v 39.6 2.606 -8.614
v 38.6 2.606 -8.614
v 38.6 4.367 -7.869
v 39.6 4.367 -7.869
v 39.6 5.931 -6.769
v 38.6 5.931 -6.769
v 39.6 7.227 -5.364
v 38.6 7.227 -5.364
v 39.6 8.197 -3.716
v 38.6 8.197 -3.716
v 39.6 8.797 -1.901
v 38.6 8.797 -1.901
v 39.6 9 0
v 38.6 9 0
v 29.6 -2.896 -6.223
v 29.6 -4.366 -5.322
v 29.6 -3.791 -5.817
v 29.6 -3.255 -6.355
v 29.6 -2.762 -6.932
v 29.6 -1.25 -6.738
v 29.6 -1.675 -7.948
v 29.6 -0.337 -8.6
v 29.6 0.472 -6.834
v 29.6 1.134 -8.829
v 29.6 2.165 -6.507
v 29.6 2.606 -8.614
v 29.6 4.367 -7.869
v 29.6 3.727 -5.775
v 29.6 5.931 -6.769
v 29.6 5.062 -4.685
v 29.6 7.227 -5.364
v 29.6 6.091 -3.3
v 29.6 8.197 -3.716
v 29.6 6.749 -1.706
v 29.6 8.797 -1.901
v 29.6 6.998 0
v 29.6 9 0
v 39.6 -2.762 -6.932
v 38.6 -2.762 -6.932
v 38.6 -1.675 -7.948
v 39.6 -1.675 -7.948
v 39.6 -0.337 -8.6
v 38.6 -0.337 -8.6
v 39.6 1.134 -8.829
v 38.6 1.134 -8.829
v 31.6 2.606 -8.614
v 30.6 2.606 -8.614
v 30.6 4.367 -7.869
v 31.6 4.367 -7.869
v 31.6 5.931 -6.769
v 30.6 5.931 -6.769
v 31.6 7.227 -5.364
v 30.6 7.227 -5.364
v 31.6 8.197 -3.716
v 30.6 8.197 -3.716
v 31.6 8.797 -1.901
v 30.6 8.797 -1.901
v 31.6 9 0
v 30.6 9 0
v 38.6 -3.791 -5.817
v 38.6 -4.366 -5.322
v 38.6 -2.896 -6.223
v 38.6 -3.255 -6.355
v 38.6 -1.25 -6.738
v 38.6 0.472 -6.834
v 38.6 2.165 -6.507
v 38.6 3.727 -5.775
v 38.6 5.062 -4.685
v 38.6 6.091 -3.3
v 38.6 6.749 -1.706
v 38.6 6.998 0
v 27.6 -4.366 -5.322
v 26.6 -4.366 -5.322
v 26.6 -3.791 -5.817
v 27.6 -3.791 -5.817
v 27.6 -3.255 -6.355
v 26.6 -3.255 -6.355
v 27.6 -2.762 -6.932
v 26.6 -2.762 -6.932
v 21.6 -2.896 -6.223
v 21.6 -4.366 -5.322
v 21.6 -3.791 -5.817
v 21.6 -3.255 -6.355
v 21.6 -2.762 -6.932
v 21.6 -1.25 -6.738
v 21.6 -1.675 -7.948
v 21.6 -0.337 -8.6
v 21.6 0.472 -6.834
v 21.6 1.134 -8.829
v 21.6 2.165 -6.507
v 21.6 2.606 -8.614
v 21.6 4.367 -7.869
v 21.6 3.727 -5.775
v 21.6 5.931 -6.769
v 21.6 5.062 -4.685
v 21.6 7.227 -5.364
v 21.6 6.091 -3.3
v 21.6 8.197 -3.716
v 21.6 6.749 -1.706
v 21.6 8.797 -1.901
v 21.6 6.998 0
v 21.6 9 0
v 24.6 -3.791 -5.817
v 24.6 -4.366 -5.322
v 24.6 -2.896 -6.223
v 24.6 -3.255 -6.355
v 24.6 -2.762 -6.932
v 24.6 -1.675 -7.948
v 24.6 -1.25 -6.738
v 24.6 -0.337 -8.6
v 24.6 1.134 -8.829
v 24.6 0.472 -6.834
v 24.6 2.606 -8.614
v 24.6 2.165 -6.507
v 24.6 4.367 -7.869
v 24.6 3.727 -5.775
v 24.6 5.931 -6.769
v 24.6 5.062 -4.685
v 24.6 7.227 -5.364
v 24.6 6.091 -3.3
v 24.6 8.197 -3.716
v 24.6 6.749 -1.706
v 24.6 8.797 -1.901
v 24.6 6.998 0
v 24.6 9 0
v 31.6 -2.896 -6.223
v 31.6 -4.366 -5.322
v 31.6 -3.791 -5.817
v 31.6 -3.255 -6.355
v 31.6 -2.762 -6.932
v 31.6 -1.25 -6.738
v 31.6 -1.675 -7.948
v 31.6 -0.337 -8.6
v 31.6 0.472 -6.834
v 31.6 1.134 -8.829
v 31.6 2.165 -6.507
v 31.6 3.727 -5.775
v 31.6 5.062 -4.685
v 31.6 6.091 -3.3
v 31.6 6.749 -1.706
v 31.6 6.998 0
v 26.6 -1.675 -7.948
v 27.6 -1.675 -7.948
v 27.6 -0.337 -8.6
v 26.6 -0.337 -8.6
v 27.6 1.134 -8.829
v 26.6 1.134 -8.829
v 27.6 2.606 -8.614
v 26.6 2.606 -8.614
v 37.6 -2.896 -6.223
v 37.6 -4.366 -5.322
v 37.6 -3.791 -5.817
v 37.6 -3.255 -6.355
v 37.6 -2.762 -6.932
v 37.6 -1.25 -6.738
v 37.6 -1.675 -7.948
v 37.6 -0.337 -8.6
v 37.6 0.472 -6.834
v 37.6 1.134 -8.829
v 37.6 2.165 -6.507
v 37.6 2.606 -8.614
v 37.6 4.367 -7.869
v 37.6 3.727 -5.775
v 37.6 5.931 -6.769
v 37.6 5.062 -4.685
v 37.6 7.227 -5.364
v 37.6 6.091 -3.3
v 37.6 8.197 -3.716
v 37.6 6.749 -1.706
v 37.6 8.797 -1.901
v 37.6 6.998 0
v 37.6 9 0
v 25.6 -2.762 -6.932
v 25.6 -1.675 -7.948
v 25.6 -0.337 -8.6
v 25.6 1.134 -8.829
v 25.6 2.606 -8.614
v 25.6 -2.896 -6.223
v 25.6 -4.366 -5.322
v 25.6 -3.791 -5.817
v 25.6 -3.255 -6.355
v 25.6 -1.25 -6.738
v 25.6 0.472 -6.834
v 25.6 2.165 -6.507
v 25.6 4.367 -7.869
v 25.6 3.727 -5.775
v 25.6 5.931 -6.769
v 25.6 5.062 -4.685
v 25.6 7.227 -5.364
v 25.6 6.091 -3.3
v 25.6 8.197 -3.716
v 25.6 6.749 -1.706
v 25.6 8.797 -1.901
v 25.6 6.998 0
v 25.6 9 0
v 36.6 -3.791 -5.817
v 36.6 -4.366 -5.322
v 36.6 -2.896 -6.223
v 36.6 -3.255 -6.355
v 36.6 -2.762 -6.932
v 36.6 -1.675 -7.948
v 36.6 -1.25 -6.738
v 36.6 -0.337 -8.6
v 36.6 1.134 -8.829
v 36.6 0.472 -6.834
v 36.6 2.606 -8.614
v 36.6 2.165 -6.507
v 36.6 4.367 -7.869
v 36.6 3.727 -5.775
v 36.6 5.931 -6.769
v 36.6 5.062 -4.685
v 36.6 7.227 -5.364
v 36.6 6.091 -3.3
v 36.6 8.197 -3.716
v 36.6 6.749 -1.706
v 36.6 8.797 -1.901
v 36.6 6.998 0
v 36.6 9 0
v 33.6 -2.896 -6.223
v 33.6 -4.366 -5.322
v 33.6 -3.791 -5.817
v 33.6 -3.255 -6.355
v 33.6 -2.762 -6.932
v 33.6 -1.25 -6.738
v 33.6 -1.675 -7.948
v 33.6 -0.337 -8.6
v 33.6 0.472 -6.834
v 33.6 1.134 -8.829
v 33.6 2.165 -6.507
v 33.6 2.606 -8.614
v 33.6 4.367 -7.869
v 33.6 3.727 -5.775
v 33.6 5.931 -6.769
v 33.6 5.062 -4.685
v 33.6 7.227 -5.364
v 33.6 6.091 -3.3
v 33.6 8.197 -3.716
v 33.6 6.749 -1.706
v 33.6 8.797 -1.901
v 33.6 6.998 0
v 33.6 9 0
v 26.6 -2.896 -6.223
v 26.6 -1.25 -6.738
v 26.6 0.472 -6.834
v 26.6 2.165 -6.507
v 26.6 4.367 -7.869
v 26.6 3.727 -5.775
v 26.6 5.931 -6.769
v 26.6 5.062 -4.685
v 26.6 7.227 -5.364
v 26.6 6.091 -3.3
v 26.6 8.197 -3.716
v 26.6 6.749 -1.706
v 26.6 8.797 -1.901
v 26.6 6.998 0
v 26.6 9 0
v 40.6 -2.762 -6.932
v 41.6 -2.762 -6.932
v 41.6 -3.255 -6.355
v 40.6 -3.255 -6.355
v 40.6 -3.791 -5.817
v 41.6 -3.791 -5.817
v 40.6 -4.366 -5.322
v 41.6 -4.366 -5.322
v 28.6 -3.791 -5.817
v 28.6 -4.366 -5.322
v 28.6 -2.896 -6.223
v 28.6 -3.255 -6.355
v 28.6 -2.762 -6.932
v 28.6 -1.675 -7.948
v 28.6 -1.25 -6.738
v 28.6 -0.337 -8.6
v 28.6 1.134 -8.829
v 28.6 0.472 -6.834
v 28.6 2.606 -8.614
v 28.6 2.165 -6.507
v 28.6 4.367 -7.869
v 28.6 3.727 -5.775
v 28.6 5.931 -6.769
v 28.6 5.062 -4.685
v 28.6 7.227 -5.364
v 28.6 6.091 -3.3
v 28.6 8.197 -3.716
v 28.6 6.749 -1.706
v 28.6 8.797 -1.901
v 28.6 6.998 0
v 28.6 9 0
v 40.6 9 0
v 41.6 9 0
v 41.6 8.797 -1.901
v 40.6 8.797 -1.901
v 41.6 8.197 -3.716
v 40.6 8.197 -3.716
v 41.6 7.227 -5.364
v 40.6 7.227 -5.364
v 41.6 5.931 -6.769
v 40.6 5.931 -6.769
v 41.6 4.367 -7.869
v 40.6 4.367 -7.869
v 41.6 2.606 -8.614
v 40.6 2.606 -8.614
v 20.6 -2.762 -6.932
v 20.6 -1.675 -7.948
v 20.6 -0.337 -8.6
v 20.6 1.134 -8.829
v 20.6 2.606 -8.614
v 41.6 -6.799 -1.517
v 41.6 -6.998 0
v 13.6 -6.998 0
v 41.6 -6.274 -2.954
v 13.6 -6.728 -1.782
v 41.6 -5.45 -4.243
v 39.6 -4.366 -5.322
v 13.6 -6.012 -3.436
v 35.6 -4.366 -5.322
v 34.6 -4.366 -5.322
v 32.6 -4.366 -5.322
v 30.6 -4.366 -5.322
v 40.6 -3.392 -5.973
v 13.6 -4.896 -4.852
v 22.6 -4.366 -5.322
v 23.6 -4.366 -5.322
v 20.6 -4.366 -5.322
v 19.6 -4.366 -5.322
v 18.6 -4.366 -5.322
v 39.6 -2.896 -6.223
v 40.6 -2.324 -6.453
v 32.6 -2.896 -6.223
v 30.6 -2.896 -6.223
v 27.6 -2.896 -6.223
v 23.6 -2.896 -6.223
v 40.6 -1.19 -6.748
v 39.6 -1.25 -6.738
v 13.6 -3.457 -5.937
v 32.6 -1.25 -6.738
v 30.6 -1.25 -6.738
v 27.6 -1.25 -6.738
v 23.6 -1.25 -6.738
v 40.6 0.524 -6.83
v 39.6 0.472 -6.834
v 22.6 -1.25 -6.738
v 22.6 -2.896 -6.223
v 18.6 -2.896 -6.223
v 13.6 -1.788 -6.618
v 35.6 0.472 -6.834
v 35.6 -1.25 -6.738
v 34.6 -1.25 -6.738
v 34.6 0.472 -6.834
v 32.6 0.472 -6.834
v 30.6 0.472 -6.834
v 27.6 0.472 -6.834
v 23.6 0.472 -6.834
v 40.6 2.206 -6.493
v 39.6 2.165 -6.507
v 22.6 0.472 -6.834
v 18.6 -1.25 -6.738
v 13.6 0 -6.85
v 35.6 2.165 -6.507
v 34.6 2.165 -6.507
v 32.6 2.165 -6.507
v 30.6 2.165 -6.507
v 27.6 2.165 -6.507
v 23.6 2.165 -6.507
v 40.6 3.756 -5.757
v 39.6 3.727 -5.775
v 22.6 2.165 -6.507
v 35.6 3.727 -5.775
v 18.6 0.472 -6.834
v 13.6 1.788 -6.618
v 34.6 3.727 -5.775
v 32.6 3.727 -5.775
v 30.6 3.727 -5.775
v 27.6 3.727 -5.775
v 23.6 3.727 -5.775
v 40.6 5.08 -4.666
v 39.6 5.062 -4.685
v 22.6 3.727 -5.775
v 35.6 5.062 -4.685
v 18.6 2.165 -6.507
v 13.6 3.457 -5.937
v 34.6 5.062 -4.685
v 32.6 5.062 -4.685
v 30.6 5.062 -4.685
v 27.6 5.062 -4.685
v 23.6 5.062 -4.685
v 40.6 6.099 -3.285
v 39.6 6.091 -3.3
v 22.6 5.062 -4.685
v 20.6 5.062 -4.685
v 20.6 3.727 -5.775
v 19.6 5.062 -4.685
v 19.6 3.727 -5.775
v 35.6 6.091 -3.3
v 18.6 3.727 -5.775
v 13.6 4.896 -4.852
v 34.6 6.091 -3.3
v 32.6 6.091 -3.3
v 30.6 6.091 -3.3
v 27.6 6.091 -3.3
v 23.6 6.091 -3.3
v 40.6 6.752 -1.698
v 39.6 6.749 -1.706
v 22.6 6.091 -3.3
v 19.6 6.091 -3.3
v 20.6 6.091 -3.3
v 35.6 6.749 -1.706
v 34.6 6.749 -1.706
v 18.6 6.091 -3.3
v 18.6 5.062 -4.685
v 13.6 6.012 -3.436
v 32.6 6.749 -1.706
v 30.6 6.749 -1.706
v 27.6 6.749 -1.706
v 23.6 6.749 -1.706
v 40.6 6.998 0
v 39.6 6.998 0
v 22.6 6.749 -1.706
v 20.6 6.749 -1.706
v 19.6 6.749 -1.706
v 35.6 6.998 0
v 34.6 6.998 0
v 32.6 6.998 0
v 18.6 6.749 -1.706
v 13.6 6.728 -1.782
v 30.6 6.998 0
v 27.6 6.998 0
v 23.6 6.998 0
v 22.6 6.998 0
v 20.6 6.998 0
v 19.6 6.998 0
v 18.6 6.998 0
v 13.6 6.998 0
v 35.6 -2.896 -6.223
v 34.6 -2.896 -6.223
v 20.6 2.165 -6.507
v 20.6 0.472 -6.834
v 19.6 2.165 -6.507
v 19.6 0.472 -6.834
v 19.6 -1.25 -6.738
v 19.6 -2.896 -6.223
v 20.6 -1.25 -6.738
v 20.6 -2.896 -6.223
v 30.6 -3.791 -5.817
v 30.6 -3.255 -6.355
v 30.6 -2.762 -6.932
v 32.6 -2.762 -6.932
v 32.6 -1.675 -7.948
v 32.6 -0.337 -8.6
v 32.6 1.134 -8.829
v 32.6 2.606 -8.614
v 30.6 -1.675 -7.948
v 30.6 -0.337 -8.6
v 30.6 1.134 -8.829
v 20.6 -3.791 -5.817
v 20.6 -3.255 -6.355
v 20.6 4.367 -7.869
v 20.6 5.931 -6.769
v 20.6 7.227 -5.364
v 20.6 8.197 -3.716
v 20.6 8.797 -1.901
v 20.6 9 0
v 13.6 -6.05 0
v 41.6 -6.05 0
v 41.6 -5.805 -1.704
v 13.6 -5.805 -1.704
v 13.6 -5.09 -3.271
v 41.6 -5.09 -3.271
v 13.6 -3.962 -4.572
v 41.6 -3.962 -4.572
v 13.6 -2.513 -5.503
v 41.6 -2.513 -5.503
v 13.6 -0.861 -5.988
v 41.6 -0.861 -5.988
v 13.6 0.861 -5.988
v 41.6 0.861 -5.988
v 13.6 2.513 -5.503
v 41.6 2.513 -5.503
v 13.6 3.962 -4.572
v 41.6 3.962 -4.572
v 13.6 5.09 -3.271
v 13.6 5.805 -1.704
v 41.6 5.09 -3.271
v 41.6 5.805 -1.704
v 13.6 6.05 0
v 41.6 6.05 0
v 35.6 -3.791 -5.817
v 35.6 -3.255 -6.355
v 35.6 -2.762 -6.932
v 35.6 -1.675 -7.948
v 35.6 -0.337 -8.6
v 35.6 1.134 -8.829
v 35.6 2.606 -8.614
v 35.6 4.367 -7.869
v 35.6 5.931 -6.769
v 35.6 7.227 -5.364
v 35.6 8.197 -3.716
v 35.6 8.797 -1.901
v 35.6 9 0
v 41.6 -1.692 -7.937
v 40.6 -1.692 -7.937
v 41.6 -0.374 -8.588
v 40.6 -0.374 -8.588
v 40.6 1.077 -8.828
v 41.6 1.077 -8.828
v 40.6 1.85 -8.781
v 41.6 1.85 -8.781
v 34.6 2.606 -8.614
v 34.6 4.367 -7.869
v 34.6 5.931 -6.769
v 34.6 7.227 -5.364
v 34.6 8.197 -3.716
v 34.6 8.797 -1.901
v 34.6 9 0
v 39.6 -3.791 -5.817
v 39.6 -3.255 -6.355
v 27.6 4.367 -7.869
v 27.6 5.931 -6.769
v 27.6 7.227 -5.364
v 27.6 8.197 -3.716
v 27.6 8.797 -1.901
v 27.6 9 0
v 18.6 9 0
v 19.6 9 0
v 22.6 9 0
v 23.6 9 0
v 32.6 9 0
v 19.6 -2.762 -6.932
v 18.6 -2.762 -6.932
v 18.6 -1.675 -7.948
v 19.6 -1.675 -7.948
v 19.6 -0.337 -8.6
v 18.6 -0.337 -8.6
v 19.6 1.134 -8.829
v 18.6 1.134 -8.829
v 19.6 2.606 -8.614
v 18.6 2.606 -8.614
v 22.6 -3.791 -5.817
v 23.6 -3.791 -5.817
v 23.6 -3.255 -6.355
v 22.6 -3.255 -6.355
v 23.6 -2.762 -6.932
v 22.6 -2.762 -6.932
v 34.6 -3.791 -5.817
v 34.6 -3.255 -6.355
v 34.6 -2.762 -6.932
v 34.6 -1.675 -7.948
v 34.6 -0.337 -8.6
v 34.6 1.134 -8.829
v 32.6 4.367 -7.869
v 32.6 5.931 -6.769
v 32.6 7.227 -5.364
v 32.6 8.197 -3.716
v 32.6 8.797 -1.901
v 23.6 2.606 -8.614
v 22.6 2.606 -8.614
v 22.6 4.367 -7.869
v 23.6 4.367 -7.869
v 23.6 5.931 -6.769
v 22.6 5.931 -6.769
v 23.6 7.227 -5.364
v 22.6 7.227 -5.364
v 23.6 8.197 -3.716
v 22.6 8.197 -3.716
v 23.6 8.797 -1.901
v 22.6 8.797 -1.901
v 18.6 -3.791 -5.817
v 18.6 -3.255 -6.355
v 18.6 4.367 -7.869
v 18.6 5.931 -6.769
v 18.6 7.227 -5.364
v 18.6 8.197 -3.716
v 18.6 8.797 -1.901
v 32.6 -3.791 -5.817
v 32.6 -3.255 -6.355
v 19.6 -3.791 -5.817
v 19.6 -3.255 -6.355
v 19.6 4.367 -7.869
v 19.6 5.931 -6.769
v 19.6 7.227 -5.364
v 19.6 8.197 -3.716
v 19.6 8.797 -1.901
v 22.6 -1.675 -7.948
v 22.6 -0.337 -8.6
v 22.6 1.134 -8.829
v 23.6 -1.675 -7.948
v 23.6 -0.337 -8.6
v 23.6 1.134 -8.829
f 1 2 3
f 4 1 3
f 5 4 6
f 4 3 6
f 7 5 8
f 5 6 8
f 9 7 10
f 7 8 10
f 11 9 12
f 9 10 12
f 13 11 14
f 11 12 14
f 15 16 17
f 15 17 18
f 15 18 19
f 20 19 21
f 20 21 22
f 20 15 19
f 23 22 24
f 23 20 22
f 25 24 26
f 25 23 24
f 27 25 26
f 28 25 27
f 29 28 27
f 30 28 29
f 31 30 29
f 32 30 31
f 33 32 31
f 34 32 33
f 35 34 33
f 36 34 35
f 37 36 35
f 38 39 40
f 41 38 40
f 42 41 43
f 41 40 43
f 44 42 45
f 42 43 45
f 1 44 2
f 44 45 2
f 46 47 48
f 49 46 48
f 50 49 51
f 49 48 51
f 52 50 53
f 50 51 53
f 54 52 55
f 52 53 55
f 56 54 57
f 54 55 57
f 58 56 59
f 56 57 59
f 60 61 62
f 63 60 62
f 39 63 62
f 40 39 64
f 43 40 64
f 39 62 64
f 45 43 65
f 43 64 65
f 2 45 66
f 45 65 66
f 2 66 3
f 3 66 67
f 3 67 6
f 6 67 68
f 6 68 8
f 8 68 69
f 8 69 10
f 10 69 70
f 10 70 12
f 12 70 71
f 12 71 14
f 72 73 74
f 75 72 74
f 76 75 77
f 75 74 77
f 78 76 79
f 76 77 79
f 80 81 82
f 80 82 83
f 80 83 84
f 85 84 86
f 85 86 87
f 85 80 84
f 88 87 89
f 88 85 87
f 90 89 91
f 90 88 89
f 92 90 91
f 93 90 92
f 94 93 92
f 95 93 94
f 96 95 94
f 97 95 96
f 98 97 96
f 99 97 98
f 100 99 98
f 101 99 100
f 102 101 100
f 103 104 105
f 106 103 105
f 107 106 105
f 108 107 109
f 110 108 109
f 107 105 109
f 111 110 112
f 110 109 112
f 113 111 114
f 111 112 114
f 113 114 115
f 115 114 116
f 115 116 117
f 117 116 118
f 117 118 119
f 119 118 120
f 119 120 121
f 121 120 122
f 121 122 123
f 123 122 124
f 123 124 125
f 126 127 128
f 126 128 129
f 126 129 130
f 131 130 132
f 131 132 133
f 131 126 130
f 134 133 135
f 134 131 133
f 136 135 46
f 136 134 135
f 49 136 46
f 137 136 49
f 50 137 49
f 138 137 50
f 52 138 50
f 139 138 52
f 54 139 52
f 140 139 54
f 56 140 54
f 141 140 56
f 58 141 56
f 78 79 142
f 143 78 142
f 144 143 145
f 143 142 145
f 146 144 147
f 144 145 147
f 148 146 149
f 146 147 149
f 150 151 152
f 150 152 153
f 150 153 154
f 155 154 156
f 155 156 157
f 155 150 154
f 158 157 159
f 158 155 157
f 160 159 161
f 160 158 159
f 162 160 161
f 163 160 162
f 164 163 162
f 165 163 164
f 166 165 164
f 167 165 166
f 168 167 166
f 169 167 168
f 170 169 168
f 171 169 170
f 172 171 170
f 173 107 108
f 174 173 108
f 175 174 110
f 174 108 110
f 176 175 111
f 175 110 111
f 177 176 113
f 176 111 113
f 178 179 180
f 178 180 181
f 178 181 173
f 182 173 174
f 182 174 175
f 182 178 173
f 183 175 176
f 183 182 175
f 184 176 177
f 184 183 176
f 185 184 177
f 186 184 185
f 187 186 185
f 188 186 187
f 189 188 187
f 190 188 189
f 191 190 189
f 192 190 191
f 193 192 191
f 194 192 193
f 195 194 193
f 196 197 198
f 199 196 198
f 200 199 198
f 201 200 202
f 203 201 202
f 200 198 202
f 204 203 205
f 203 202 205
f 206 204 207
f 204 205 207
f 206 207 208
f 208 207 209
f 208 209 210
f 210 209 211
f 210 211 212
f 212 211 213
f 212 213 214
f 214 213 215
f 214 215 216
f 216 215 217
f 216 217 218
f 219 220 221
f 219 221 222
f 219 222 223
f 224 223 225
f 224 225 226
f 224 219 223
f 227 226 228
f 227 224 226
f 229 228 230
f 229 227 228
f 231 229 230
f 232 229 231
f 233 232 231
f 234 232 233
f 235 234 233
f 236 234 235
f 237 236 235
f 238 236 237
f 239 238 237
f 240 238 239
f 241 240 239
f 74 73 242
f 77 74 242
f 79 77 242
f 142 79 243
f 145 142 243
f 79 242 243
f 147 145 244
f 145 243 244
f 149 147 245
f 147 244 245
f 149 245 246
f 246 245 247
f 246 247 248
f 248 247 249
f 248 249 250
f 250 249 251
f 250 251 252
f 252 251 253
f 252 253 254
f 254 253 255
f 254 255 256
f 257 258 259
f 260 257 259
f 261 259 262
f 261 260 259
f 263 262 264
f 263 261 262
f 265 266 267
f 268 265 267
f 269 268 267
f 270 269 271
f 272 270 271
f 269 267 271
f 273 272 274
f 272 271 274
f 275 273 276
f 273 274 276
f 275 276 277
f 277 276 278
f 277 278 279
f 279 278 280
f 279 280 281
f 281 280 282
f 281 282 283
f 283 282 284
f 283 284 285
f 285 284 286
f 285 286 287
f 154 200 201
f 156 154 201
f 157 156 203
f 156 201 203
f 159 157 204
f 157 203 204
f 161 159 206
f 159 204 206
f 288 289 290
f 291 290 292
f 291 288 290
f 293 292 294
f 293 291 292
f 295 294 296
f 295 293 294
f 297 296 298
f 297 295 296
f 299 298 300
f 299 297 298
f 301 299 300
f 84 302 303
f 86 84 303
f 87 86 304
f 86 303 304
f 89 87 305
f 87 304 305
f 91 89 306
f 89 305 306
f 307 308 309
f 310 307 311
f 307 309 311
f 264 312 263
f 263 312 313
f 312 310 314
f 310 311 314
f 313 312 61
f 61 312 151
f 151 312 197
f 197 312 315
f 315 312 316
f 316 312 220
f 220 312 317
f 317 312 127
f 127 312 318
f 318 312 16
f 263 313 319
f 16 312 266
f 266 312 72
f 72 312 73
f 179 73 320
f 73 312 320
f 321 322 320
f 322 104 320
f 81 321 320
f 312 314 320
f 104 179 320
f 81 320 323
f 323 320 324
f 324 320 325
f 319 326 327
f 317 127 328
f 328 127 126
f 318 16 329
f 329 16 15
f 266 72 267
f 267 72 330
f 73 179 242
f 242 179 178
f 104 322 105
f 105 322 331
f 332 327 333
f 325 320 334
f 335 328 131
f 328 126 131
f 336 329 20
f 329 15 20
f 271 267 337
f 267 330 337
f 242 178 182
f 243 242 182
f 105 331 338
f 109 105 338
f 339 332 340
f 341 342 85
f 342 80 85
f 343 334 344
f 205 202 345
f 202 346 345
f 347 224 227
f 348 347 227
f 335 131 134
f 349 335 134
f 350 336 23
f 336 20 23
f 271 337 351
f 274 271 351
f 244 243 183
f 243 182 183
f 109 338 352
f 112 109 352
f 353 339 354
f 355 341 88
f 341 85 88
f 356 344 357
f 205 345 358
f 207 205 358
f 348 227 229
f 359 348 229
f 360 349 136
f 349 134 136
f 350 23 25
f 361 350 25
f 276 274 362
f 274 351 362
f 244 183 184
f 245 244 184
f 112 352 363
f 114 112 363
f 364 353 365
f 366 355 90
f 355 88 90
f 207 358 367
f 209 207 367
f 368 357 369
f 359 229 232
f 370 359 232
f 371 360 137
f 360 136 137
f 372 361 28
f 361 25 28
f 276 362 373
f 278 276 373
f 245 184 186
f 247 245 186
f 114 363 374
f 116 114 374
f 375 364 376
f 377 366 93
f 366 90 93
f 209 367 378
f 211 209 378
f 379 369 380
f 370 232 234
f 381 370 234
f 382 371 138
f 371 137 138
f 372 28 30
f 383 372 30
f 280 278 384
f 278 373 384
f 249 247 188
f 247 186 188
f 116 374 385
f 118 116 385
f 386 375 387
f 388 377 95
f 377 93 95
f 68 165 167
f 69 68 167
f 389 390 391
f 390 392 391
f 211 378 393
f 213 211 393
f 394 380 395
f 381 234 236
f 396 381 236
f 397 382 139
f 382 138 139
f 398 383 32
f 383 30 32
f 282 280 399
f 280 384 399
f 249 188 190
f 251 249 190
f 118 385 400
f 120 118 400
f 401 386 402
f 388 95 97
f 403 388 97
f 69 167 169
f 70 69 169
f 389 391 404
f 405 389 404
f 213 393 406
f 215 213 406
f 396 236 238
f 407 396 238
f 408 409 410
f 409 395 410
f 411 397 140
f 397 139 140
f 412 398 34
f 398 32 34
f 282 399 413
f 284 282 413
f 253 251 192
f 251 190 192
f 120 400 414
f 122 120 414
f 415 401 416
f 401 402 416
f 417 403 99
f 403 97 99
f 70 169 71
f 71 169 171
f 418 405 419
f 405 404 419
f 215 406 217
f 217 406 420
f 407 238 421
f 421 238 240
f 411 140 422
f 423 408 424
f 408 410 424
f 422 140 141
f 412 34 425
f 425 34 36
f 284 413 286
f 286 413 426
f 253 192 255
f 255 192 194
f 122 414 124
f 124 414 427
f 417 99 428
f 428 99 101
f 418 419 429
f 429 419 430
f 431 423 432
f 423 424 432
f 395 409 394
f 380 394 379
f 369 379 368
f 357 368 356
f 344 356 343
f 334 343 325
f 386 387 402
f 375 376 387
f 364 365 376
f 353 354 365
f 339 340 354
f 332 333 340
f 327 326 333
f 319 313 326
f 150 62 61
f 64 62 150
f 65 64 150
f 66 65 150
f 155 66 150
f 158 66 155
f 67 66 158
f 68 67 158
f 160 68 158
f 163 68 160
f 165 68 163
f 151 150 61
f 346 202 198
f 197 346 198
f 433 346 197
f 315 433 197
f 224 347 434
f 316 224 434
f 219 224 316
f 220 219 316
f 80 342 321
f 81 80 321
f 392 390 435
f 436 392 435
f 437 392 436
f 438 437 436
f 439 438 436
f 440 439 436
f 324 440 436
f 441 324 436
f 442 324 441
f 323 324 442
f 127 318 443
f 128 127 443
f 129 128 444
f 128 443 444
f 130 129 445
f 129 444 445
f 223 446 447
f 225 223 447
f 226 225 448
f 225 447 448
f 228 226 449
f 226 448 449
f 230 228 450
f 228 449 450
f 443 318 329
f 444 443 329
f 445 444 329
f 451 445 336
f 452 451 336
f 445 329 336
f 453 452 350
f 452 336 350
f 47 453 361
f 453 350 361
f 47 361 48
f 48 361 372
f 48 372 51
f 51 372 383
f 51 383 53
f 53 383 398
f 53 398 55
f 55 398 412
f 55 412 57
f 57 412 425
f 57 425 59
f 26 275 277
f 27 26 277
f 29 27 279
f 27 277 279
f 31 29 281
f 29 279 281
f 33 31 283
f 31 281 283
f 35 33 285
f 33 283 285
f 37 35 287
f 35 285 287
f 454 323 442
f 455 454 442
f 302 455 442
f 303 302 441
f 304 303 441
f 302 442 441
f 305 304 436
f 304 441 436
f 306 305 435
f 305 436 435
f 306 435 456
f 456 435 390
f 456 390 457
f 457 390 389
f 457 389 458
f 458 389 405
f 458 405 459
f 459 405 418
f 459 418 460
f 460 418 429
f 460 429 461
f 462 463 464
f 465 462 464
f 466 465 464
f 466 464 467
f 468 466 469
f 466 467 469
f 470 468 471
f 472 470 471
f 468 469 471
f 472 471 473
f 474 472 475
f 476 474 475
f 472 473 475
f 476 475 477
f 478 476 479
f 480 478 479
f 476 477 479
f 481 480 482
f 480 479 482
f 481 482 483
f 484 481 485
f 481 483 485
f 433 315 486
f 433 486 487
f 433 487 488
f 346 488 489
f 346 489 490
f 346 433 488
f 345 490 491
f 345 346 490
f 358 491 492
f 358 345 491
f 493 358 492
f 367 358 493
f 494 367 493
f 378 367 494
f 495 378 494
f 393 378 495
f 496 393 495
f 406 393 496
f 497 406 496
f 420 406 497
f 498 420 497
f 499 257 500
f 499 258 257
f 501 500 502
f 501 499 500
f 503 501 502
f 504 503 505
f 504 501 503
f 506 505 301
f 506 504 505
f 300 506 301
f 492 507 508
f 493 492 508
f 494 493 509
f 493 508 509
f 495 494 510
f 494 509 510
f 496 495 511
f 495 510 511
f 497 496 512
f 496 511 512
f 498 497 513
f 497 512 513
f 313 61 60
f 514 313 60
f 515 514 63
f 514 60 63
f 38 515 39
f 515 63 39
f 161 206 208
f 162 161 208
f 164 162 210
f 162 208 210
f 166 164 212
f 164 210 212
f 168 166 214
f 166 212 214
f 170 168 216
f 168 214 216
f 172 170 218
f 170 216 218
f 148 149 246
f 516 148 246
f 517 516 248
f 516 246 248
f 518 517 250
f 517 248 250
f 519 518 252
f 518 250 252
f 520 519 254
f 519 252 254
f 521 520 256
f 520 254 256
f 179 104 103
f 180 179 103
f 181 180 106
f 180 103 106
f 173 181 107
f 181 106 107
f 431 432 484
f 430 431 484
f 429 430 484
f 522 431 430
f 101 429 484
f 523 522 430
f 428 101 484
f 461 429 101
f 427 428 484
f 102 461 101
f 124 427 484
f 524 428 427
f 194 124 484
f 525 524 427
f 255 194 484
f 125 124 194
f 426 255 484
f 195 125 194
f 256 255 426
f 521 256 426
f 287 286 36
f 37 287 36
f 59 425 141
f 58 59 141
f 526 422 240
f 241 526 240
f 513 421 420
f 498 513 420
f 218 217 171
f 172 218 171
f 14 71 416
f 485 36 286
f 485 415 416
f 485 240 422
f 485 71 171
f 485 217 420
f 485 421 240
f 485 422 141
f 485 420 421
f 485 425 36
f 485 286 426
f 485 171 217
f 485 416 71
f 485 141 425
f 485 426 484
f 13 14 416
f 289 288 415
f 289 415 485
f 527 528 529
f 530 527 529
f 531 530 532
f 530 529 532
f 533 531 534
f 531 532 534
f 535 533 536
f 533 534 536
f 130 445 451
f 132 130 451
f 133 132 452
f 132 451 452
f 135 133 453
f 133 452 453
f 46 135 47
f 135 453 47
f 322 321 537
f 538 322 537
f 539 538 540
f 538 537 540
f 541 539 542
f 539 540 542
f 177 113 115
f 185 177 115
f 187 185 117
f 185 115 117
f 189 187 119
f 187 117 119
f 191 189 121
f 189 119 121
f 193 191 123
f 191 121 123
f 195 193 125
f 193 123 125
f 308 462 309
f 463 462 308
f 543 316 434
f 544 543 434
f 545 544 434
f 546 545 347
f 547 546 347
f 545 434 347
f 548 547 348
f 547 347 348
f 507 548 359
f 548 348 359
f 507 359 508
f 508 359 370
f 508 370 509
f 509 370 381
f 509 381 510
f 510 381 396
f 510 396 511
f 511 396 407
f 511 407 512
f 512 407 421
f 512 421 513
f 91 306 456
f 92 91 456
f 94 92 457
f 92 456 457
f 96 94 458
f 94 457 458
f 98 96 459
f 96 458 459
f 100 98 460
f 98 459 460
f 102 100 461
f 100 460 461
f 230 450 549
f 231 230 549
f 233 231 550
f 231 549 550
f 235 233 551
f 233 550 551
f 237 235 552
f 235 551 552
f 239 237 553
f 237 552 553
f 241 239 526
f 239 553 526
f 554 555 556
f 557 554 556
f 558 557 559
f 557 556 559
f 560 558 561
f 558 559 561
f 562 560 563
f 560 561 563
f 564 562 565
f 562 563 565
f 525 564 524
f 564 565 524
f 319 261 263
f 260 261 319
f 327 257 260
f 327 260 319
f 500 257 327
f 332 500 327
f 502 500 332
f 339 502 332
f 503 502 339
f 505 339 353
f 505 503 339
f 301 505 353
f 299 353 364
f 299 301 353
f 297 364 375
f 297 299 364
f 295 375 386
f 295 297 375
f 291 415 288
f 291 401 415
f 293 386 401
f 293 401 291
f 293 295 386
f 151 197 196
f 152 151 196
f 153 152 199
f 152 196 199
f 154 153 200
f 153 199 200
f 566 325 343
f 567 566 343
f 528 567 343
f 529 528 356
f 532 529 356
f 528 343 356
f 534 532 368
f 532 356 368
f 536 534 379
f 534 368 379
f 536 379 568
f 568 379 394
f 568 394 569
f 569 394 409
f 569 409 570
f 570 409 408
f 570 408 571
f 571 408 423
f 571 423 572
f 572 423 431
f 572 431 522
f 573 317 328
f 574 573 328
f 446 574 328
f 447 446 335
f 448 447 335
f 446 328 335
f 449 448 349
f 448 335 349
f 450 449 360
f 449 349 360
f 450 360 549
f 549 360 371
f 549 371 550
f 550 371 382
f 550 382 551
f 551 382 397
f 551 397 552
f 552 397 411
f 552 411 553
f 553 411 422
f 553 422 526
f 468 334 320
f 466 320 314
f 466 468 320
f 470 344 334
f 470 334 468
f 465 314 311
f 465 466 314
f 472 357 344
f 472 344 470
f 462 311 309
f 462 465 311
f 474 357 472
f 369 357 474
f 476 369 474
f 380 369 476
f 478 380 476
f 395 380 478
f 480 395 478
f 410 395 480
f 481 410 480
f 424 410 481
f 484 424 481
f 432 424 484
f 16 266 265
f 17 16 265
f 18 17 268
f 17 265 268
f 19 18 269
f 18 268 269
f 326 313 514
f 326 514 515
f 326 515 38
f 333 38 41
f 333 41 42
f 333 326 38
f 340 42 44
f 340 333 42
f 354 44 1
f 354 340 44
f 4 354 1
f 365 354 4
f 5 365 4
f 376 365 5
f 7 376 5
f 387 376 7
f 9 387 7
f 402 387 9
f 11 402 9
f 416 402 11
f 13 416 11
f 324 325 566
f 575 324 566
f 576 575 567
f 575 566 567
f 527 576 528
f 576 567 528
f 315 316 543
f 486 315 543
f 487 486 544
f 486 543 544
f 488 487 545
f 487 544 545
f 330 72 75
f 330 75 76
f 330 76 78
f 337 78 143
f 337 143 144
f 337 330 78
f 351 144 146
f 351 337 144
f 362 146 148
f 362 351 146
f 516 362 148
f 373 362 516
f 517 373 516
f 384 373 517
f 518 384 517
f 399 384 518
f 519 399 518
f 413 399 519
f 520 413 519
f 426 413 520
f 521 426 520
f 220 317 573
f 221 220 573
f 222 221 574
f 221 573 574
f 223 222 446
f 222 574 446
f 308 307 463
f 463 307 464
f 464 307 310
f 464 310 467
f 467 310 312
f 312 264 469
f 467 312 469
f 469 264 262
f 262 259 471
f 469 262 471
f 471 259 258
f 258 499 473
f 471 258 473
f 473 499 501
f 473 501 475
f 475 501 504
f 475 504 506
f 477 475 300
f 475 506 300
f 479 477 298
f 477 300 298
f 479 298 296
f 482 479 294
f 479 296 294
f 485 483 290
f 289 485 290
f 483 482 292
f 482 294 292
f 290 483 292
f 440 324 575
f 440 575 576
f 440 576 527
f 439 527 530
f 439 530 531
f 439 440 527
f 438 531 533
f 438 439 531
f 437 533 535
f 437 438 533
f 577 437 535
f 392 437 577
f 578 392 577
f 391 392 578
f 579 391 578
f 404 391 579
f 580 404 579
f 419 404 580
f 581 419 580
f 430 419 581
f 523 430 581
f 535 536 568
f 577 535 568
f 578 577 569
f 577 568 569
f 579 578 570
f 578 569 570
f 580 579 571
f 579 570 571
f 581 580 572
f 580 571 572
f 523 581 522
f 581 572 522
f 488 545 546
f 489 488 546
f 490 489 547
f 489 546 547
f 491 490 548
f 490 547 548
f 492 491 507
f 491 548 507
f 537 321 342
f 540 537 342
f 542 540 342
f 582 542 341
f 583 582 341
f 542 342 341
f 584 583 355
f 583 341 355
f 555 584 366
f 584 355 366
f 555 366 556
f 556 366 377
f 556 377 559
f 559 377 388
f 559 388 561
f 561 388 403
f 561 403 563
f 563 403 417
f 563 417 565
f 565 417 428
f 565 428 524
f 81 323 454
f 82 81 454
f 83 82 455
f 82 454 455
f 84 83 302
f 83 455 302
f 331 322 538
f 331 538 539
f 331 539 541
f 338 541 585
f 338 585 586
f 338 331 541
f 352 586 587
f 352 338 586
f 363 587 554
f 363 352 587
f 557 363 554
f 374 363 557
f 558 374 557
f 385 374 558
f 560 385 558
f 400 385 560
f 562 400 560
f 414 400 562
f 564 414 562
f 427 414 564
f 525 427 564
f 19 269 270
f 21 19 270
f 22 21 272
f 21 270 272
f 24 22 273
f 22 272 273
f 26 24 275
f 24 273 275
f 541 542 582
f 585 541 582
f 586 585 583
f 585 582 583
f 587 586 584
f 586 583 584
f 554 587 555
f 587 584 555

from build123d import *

# Parameters (mm, degrees)
SKETCH1_R           = 7
SKETCH1_R_2         = 0.8
SKETCH1_R_3         = 4
BOSS_EXTRUDE1_DEPTH = 1.5
SKETCH2_R           = 7
SKETCH2_R_2         = 6.4
BOSS_EXTRUDE2_DEPTH = 40.1
BOSS_EXTRUDE5_REACH = 44.786
SKETCH12_R          = 6.4
SKETCH12_R_2        = 6.05
BOSS_EXTRUDE7_START = -1
BOSS_EXTRUDE7_DEPTH = 1
FILLET2_R           = 10
FILLET3_R           = 5
LPATTERN1_START     = 18.6
LPATTERN1_DEPTH     = 1
LPATTERN1_START_2   = 20.6
LPATTERN1_2_DEPTH   = 1
LPATTERN1_START_3   = 22.6
LPATTERN1_3_DEPTH   = 1
LPATTERN1_START_4   = 24.6
LPATTERN1_4_DEPTH   = 1
LPATTERN1_START_5   = 26.6
LPATTERN1_5_DEPTH   = 1
LPATTERN1_START_6   = 28.6
LPATTERN1_6_DEPTH   = 1
LPATTERN1_START_7   = 30.6
LPATTERN1_7_DEPTH   = 1
LPATTERN1_START_8   = 32.6
LPATTERN1_8_DEPTH   = 1
LPATTERN1_START_9   = 34.6
LPATTERN1_9_DEPTH   = 1
LPATTERN1_START_10  = 36.6
LPATTERN1_10_DEPTH  = 1
LPATTERN1_START_11  = 38.6
LPATTERN1_11_DEPTH  = 1
SKETCH15_W          = 17.693531028
SKETCH15_H          = 16
SKETCH16_W          = 28
SKETCH16_H          = 16


with BuildPart() as part:
    # Sketch1 → Boss-Extrude1 (new body)
    with BuildSketch(Plane(origin=(0, 0, 0), x_dir=(0, 0, -1), z_dir=(1, 0, 0))):
        with Locations((-0.15, 0)):
            Circle(SKETCH1_R)
        with Locations((0, 5)):
            Circle(SKETCH1_R_2, mode=Mode.SUBTRACT)
        with Locations((-4.330127019, -2.5)):
            Circle(SKETCH1_R_2, mode=Mode.SUBTRACT)
        with Locations((4.330127019, -2.5)):
            Circle(SKETCH1_R_2, mode=Mode.SUBTRACT)
        Circle(SKETCH1_R_3, mode=Mode.SUBTRACT)
    extrude(amount=BOSS_EXTRUDE1_DEPTH)

    # Sketch2 → Boss-Extrude2 (add)
    with BuildSketch(Plane(origin=(1.5, 0, 0), x_dir=(0, 0, -1), z_dir=(1, 0, 0))):
        with Locations((-0.15, 0)):
            Circle(SKETCH2_R)
        with Locations((-0.15, 0)):
            Circle(SKETCH2_R_2, mode=Mode.SUBTRACT)
    extrude(amount=BOSS_EXTRUDE2_DEPTH)

    # Sketch12 → Boss-Extrude5 (add, up to next)
    with BuildSketch(Plane(origin=(41.6, 0, 0), x_dir=(0, 0, -1), z_dir=(1, 0, 0)), mode=Mode.PRIVATE) as boss_extrude5_sk1:
        with Locations((-0.15, 0)):
            Circle(SKETCH12_R)
        Circle(SKETCH12_R_2, mode=Mode.SUBTRACT)
    boss_extrude5_tool1 = extrude(boss_extrude5_sk1.sketch, amount=-BOSS_EXTRUDE5_REACH, mode=Mode.PRIVATE) - part.part
    add(boss_extrude5_tool1.solids().sort_by_distance((41.6, 0, 6.368981))[0])

    # Sketch14 → Boss-Extrude7 (add)
    with BuildSketch(Plane(origin=(41.6, 0, 0), x_dir=(0, 0, -1), z_dir=(1, 0, 0)).offset(BOSS_EXTRUDE7_START)):
        with BuildLine():
            Line((-7.039083492, -1.241180339), (-8.863269777, -1.562833599))
            ThreePointArc((-8.863269777, -1.562833599), (0, 9), (8.863269777, -1.562833599))
            Line((8.863269777, -1.562833599), (6.748129599, -1.189877318))
            ThreePointArc((6.748129599, -1.189877318), (-0.176047227, 6.999951539), (-7.039083492, -1.241180339))
        make_face()
    extrude(amount=BOSS_EXTRUDE7_DEPTH)

    # Fillet2
    # the kernel refuses this fillet: 10 mm, written as the material it adds along each edge
    with BuildSketch(Plane(origin=(40.6, -1.189877318, -6.748129599), x_dir=(0, -0.9122124275498226, 0.40971756982543417), z_dir=(1, 0, 0))) as fillet2_piece_1:
        with BuildLine():
            CenterArc((5.968676638, 9.685818843), FILLET2_R, 229.495547536, 26.104158306)
            Line((-0.526394739, 2.082263897), (-0.656296166, 1.930192799))
            ThreePointArc((-0.656296166, 1.930192799), (-0.457097485, 0.992114146), (-0.193900116, -0.049017803))
            Line((-0.193900116, -0.049017803), (0.049738972, -0.193716377))
            ThreePointArc((0.049738972, -0.193716377), (1.740864019, 0.01992681), (3.431989067, -0.193716377))
            Line((3.431989067, -0.193716377), (3.481728039, 0))
        make_face()
    extrude(amount=1)
    with BuildSketch(Plane(origin=(40.6, -1.241180339, 7.039083492), x_dir=(0, -0.9145376119425217, -0.4045008731047063), z_dir=(1, 0, 0))) as fillet2_piece_2:
        with BuildLine():
            CenterArc((5.662402917, -9.717692138), FILLET2_R, 103.646653122, 23.987142505)
            Line((-0.443720941, -1.798395993), (-0.565843418, -1.64001007))
            ThreePointArc((-0.565843418, -1.64001007), (-0.416037384, -0.851288435), (-0.194176914, 0.047909561))
            Line((-0.194176914, 0.047909561), (0.047186691, 0.194353843))
            ThreePointArc((0.047186691, 0.194353843), (1.651534184, 0.002384497), (3.255881677, 0.194353843))
            Line((3.255881677, 0.194353843), (3.303068368, 0))
        make_face()
    extrude(amount=1)

    # Fillet3
    fillet3_edges = [part.edges().sort_by_distance(p)[0] for p in [
        (41.1, -1.562833599, 8.863269777),
        (41.1, -1.562833599, -8.863269777),
    ]]
    fillet(fillet3_edges, radius=FILLET3_R)

    # LPattern1: read off the stored shape, not the designer's step
    # LPattern1 outline → LPattern1 (add)
    with BuildSketch(Plane.YZ.offset(LPATTERN1_START)):
        with BuildLine():
            ThreePointArc((-2.762069023, -6.931785952), (-0.336916962, -8.599750686), (2.606424088, -8.614322578))
            ThreePointArc((2.606424088, -8.614322578), (8.998759062, 0.149450112), (2.31893468, 8.696122236))
            ThreePointArc((2.31893468, 8.696122236), (-0.448823677, 8.641049813), (-2.763066821, 7.121905987))
            ThreePointArc((-2.763066821, 7.121905987), (-3.475808056, 6.373673153), (-4.261960597, 5.702989453))
            ThreePointArc((-4.261960597, 5.702989453), (6.999688602, 0.083973644), (-4.365952904, -5.321604449))
            ThreePointArc((-4.365952904, -5.321604449), (-3.518119256, -6.080982981), (-2.762069023, -6.931785952))
        make_face()
    extrude(amount=LPATTERN1_DEPTH)

    # LPattern1 2 outline → LPattern1 2 (add)
    with BuildSketch(Plane.YZ.offset(LPATTERN1_START_2)):
        with BuildLine():
            ThreePointArc((-2.762069023, -6.931785952), (-0.336916962, -8.599750686), (2.606424088, -8.614322578))
            ThreePointArc((2.606424088, -8.614322578), (8.998759062, 0.149450112), (2.31893468, 8.696122236))
            ThreePointArc((2.31893468, 8.696122236), (-0.448823677, 8.641049813), (-2.763066821, 7.121905987))
            ThreePointArc((-2.763066821, 7.121905987), (-3.475808056, 6.373673153), (-4.261960597, 5.702989453))
            ThreePointArc((-4.261960597, 5.702989453), (6.999688602, 0.083973644), (-4.365952904, -5.321604449))
            ThreePointArc((-4.365952904, -5.321604449), (-3.518119256, -6.080982981), (-2.762069023, -6.931785952))
        make_face()
    extrude(amount=LPATTERN1_2_DEPTH)

    # LPattern1 3 outline → LPattern1 3 (add)
    with BuildSketch(Plane.YZ.offset(LPATTERN1_START_3)):
        with BuildLine():
            ThreePointArc((-2.762069023, -6.931785952), (-0.336916962, -8.599750686), (2.606424088, -8.614322578))
            ThreePointArc((2.606424088, -8.614322578), (8.998759062, 0.149450112), (2.31893468, 8.696122236))
            ThreePointArc((2.31893468, 8.696122236), (-0.448823677, 8.641049813), (-2.763066821, 7.121905987))
            ThreePointArc((-2.763066821, 7.121905987), (-3.475808056, 6.373673153), (-4.261960597, 5.702989453))
            ThreePointArc((-4.261960597, 5.702989453), (6.999688602, 0.083973644), (-4.365952904, -5.321604449))
            ThreePointArc((-4.365952904, -5.321604449), (-3.518119256, -6.080982981), (-2.762069023, -6.931785952))
        make_face()
    extrude(amount=LPATTERN1_3_DEPTH)

    # LPattern1 4 outline → LPattern1 4 (add)
    with BuildSketch(Plane.YZ.offset(LPATTERN1_START_4)):
        with BuildLine():
            ThreePointArc((-2.762069023, -6.931785952), (-0.336916962, -8.599750686), (2.606424088, -8.614322578))
            ThreePointArc((2.606424088, -8.614322578), (8.998759062, 0.149450112), (2.31893468, 8.696122236))
            ThreePointArc((2.31893468, 8.696122236), (-0.448823677, 8.641049813), (-2.763066821, 7.121905987))
            ThreePointArc((-2.763066821, 7.121905987), (-3.475808056, 6.373673153), (-4.261960597, 5.702989453))
            ThreePointArc((-4.261960597, 5.702989453), (6.999688602, 0.083973644), (-4.365952904, -5.321604449))
            ThreePointArc((-4.365952904, -5.321604449), (-3.518119256, -6.080982981), (-2.762069023, -6.931785952))
        make_face()
    extrude(amount=LPATTERN1_4_DEPTH)

    # LPattern1 5 outline → LPattern1 5 (add)
    with BuildSketch(Plane.YZ.offset(LPATTERN1_START_5)):
        with BuildLine():
            ThreePointArc((-2.762069023, -6.931785952), (-0.336916962, -8.599750686), (2.606424088, -8.614322578))
            ThreePointArc((2.606424088, -8.614322578), (8.998759062, 0.149450112), (2.31893468, 8.696122236))
            ThreePointArc((2.31893468, 8.696122236), (-0.448823677, 8.641049813), (-2.763066821, 7.121905987))
            ThreePointArc((-2.763066821, 7.121905987), (-3.475808056, 6.373673153), (-4.261960597, 5.702989453))
            ThreePointArc((-4.261960597, 5.702989453), (6.999688602, 0.083973644), (-4.365952904, -5.321604449))
            ThreePointArc((-4.365952904, -5.321604449), (-3.518119256, -6.080982981), (-2.762069023, -6.931785952))
        make_face()
    extrude(amount=LPATTERN1_5_DEPTH)

    # LPattern1 6 outline → LPattern1 6 (add)
    with BuildSketch(Plane.YZ.offset(LPATTERN1_START_6)):
        with BuildLine():
            ThreePointArc((-2.762069023, -6.931785952), (-0.336916962, -8.599750686), (2.606424088, -8.614322578))
            ThreePointArc((2.606424088, -8.614322578), (8.998759062, 0.149450112), (2.31893468, 8.696122236))
            ThreePointArc((2.31893468, 8.696122236), (-0.448823677, 8.641049813), (-2.763066821, 7.121905987))
            ThreePointArc((-2.763066821, 7.121905987), (-3.475808056, 6.373673153), (-4.261960597, 5.702989453))
            ThreePointArc((-4.261960597, 5.702989453), (6.999688602, 0.083973644), (-4.365952904, -5.321604449))
            ThreePointArc((-4.365952904, -5.321604449), (-3.518119256, -6.080982981), (-2.762069023, -6.931785952))
        make_face()
    extrude(amount=LPATTERN1_6_DEPTH)

    # LPattern1 7 outline → LPattern1 7 (add)
    with BuildSketch(Plane.YZ.offset(LPATTERN1_START_7)):
        with BuildLine():
            ThreePointArc((-2.762069023, -6.931785952), (-0.336916962, -8.599750686), (2.606424088, -8.614322578))
            ThreePointArc((2.606424088, -8.614322578), (8.998759062, 0.149450112), (2.31893468, 8.696122236))
            ThreePointArc((2.31893468, 8.696122236), (-0.448823677, 8.641049813), (-2.763066821, 7.121905987))
            ThreePointArc((-2.763066821, 7.121905987), (-3.475808056, 6.373673153), (-4.261960597, 5.702989453))
            ThreePointArc((-4.261960597, 5.702989453), (6.999688602, 0.083973644), (-4.365952904, -5.321604449))
            ThreePointArc((-4.365952904, -5.321604449), (-3.518119256, -6.080982981), (-2.762069023, -6.931785952))
        make_face()
    extrude(amount=LPATTERN1_7_DEPTH)

    # LPattern1 8 outline → LPattern1 8 (add)
    with BuildSketch(Plane.YZ.offset(LPATTERN1_START_8)):
        with BuildLine():
            ThreePointArc((-2.762069023, -6.931785952), (-0.336916962, -8.599750686), (2.606424088, -8.614322578))
            ThreePointArc((2.606424088, -8.614322578), (8.998759062, 0.149450112), (2.31893468, 8.696122236))
            ThreePointArc((2.31893468, 8.696122236), (-0.448823677, 8.641049813), (-2.763066821, 7.121905987))
            ThreePointArc((-2.763066821, 7.121905987), (-3.475808056, 6.373673153), (-4.261960597, 5.702989453))
            ThreePointArc((-4.261960597, 5.702989453), (6.999688602, 0.083973644), (-4.365952904, -5.321604449))
            ThreePointArc((-4.365952904, -5.321604449), (-3.518119256, -6.080982981), (-2.762069023, -6.931785952))
        make_face()
    extrude(amount=LPATTERN1_8_DEPTH)

    # LPattern1 9 outline → LPattern1 9 (add)
    with BuildSketch(Plane.YZ.offset(LPATTERN1_START_9)):
        with BuildLine():
            ThreePointArc((-2.762069023, -6.931785952), (-0.336916962, -8.599750686), (2.606424088, -8.614322578))
            ThreePointArc((2.606424088, -8.614322578), (8.998759062, 0.149450112), (2.31893468, 8.696122236))
            ThreePointArc((2.31893468, 8.696122236), (-0.448823677, 8.641049813), (-2.763066821, 7.121905987))
            ThreePointArc((-2.763066821, 7.121905987), (-3.475808056, 6.373673153), (-4.261960597, 5.702989453))
            ThreePointArc((-4.261960597, 5.702989453), (6.999688602, 0.083973644), (-4.365952904, -5.321604449))
            ThreePointArc((-4.365952904, -5.321604449), (-3.518119256, -6.080982981), (-2.762069023, -6.931785952))
        make_face()
    extrude(amount=LPATTERN1_9_DEPTH)

    # LPattern1 10 outline → LPattern1 10 (add)
    with BuildSketch(Plane.YZ.offset(LPATTERN1_START_10)):
        with BuildLine():
            ThreePointArc((-2.762069023, -6.931785952), (-0.336916962, -8.599750686), (2.606424088, -8.614322578))
            ThreePointArc((2.606424088, -8.614322578), (8.998759062, 0.149450112), (2.31893468, 8.696122236))
            ThreePointArc((2.31893468, 8.696122236), (-0.448823677, 8.641049813), (-2.763066821, 7.121905987))
            ThreePointArc((-2.763066821, 7.121905987), (-3.475808056, 6.373673153), (-4.261960597, 5.702989453))
            ThreePointArc((-4.261960597, 5.702989453), (6.999688602, 0.083973644), (-4.365952904, -5.321604449))
            ThreePointArc((-4.365952904, -5.321604449), (-3.518119256, -6.080982981), (-2.762069023, -6.931785952))
        make_face()
    extrude(amount=LPATTERN1_10_DEPTH)

    # LPattern1 11 outline → LPattern1 11 (add)
    with BuildSketch(Plane.YZ.offset(LPATTERN1_START_11)):
        with BuildLine():
            ThreePointArc((-2.762069023, -6.931785952), (-0.336916962, -8.599750686), (2.606424088, -8.614322578))
            ThreePointArc((2.606424088, -8.614322578), (8.998759062, 0.149450112), (2.31893468, 8.696122236))
            ThreePointArc((2.31893468, 8.696122236), (-0.448823677, 8.641049813), (-2.763066821, 7.121905987))
            ThreePointArc((-2.763066821, 7.121905987), (-3.475808056, 6.373673153), (-4.261960597, 5.702989453))
            ThreePointArc((-4.261960597, 5.702989453), (6.999688602, 0.083973644), (-4.365952904, -5.321604449))
            ThreePointArc((-4.365952904, -5.321604449), (-3.518119256, -6.080982981), (-2.762069023, -6.931785952))
        make_face()
    extrude(amount=LPATTERN1_11_DEPTH)


with BuildPart() as body_2:
    # Split2: the piece behind the surface
    add(part.part)
    # Sketch15 → Surface-Plane1: a flat surface bounded by the sketch
    with BuildSketch(Plane.ZY.offset(-13.6), mode=Mode.PRIVATE) as surface_plane1_1_region:
        with Locations((0.018177702, 1)):
            Rectangle(SKETCH15_W, SKETCH15_H)
    surface_plane1_1 = surface_plane1_1_region.sketch.faces()[0]
    split(bisect_by=surface_plane1_1, keep=Keep.BOTTOM)


with BuildPart() as part_1:
    add(part.part)

    # Split2: split by a surface, the side it looks to stays
    # Sketch15 → Surface-Plane1: a flat surface bounded by the sketch
    with BuildSketch(Plane.ZY.offset(-13.6), mode=Mode.PRIVATE) as surface_plane1_2_region:
        with Locations((0.018177702, 1)):
            Rectangle(SKETCH15_W, SKETCH15_H)
    surface_plane1_2 = surface_plane1_2_region.sketch.faces()[0]
    split(bisect_by=surface_plane1_2, keep=Keep.TOP)


with BuildPart() as body_2_2:
    # Split3: the piece behind the surface
    add(body_2.part)
    # Sketch16 → Surface-Plane2: a flat surface bounded by the sketch
    with BuildSketch(Plane.XY, mode=Mode.PRIVATE) as surface_plane2_3_region:
        with Locations((27.6, 1)):
            Rectangle(SKETCH16_W, SKETCH16_H)
    surface_plane2_3 = surface_plane2_3_region.sketch.faces()[0]
    split(bisect_by=surface_plane2_3, keep=Keep.BOTTOM)


with BuildPart() as body_2_1:
    add(body_2.part)

    # Split3: split by a surface, the side it looks to stays
    # Sketch16 → Surface-Plane2: a flat surface bounded by the sketch
    with BuildSketch(Plane.XY, mode=Mode.PRIVATE) as surface_plane2_4_region:
        with Locations((27.6, 1)):
            Rectangle(SKETCH16_W, SKETCH16_H)
    surface_plane2_4 = surface_plane2_4_region.sketch.faces()[0]
    split(bisect_by=surface_plane2_4, keep=Keep.TOP)


solid = body_2_2.part
